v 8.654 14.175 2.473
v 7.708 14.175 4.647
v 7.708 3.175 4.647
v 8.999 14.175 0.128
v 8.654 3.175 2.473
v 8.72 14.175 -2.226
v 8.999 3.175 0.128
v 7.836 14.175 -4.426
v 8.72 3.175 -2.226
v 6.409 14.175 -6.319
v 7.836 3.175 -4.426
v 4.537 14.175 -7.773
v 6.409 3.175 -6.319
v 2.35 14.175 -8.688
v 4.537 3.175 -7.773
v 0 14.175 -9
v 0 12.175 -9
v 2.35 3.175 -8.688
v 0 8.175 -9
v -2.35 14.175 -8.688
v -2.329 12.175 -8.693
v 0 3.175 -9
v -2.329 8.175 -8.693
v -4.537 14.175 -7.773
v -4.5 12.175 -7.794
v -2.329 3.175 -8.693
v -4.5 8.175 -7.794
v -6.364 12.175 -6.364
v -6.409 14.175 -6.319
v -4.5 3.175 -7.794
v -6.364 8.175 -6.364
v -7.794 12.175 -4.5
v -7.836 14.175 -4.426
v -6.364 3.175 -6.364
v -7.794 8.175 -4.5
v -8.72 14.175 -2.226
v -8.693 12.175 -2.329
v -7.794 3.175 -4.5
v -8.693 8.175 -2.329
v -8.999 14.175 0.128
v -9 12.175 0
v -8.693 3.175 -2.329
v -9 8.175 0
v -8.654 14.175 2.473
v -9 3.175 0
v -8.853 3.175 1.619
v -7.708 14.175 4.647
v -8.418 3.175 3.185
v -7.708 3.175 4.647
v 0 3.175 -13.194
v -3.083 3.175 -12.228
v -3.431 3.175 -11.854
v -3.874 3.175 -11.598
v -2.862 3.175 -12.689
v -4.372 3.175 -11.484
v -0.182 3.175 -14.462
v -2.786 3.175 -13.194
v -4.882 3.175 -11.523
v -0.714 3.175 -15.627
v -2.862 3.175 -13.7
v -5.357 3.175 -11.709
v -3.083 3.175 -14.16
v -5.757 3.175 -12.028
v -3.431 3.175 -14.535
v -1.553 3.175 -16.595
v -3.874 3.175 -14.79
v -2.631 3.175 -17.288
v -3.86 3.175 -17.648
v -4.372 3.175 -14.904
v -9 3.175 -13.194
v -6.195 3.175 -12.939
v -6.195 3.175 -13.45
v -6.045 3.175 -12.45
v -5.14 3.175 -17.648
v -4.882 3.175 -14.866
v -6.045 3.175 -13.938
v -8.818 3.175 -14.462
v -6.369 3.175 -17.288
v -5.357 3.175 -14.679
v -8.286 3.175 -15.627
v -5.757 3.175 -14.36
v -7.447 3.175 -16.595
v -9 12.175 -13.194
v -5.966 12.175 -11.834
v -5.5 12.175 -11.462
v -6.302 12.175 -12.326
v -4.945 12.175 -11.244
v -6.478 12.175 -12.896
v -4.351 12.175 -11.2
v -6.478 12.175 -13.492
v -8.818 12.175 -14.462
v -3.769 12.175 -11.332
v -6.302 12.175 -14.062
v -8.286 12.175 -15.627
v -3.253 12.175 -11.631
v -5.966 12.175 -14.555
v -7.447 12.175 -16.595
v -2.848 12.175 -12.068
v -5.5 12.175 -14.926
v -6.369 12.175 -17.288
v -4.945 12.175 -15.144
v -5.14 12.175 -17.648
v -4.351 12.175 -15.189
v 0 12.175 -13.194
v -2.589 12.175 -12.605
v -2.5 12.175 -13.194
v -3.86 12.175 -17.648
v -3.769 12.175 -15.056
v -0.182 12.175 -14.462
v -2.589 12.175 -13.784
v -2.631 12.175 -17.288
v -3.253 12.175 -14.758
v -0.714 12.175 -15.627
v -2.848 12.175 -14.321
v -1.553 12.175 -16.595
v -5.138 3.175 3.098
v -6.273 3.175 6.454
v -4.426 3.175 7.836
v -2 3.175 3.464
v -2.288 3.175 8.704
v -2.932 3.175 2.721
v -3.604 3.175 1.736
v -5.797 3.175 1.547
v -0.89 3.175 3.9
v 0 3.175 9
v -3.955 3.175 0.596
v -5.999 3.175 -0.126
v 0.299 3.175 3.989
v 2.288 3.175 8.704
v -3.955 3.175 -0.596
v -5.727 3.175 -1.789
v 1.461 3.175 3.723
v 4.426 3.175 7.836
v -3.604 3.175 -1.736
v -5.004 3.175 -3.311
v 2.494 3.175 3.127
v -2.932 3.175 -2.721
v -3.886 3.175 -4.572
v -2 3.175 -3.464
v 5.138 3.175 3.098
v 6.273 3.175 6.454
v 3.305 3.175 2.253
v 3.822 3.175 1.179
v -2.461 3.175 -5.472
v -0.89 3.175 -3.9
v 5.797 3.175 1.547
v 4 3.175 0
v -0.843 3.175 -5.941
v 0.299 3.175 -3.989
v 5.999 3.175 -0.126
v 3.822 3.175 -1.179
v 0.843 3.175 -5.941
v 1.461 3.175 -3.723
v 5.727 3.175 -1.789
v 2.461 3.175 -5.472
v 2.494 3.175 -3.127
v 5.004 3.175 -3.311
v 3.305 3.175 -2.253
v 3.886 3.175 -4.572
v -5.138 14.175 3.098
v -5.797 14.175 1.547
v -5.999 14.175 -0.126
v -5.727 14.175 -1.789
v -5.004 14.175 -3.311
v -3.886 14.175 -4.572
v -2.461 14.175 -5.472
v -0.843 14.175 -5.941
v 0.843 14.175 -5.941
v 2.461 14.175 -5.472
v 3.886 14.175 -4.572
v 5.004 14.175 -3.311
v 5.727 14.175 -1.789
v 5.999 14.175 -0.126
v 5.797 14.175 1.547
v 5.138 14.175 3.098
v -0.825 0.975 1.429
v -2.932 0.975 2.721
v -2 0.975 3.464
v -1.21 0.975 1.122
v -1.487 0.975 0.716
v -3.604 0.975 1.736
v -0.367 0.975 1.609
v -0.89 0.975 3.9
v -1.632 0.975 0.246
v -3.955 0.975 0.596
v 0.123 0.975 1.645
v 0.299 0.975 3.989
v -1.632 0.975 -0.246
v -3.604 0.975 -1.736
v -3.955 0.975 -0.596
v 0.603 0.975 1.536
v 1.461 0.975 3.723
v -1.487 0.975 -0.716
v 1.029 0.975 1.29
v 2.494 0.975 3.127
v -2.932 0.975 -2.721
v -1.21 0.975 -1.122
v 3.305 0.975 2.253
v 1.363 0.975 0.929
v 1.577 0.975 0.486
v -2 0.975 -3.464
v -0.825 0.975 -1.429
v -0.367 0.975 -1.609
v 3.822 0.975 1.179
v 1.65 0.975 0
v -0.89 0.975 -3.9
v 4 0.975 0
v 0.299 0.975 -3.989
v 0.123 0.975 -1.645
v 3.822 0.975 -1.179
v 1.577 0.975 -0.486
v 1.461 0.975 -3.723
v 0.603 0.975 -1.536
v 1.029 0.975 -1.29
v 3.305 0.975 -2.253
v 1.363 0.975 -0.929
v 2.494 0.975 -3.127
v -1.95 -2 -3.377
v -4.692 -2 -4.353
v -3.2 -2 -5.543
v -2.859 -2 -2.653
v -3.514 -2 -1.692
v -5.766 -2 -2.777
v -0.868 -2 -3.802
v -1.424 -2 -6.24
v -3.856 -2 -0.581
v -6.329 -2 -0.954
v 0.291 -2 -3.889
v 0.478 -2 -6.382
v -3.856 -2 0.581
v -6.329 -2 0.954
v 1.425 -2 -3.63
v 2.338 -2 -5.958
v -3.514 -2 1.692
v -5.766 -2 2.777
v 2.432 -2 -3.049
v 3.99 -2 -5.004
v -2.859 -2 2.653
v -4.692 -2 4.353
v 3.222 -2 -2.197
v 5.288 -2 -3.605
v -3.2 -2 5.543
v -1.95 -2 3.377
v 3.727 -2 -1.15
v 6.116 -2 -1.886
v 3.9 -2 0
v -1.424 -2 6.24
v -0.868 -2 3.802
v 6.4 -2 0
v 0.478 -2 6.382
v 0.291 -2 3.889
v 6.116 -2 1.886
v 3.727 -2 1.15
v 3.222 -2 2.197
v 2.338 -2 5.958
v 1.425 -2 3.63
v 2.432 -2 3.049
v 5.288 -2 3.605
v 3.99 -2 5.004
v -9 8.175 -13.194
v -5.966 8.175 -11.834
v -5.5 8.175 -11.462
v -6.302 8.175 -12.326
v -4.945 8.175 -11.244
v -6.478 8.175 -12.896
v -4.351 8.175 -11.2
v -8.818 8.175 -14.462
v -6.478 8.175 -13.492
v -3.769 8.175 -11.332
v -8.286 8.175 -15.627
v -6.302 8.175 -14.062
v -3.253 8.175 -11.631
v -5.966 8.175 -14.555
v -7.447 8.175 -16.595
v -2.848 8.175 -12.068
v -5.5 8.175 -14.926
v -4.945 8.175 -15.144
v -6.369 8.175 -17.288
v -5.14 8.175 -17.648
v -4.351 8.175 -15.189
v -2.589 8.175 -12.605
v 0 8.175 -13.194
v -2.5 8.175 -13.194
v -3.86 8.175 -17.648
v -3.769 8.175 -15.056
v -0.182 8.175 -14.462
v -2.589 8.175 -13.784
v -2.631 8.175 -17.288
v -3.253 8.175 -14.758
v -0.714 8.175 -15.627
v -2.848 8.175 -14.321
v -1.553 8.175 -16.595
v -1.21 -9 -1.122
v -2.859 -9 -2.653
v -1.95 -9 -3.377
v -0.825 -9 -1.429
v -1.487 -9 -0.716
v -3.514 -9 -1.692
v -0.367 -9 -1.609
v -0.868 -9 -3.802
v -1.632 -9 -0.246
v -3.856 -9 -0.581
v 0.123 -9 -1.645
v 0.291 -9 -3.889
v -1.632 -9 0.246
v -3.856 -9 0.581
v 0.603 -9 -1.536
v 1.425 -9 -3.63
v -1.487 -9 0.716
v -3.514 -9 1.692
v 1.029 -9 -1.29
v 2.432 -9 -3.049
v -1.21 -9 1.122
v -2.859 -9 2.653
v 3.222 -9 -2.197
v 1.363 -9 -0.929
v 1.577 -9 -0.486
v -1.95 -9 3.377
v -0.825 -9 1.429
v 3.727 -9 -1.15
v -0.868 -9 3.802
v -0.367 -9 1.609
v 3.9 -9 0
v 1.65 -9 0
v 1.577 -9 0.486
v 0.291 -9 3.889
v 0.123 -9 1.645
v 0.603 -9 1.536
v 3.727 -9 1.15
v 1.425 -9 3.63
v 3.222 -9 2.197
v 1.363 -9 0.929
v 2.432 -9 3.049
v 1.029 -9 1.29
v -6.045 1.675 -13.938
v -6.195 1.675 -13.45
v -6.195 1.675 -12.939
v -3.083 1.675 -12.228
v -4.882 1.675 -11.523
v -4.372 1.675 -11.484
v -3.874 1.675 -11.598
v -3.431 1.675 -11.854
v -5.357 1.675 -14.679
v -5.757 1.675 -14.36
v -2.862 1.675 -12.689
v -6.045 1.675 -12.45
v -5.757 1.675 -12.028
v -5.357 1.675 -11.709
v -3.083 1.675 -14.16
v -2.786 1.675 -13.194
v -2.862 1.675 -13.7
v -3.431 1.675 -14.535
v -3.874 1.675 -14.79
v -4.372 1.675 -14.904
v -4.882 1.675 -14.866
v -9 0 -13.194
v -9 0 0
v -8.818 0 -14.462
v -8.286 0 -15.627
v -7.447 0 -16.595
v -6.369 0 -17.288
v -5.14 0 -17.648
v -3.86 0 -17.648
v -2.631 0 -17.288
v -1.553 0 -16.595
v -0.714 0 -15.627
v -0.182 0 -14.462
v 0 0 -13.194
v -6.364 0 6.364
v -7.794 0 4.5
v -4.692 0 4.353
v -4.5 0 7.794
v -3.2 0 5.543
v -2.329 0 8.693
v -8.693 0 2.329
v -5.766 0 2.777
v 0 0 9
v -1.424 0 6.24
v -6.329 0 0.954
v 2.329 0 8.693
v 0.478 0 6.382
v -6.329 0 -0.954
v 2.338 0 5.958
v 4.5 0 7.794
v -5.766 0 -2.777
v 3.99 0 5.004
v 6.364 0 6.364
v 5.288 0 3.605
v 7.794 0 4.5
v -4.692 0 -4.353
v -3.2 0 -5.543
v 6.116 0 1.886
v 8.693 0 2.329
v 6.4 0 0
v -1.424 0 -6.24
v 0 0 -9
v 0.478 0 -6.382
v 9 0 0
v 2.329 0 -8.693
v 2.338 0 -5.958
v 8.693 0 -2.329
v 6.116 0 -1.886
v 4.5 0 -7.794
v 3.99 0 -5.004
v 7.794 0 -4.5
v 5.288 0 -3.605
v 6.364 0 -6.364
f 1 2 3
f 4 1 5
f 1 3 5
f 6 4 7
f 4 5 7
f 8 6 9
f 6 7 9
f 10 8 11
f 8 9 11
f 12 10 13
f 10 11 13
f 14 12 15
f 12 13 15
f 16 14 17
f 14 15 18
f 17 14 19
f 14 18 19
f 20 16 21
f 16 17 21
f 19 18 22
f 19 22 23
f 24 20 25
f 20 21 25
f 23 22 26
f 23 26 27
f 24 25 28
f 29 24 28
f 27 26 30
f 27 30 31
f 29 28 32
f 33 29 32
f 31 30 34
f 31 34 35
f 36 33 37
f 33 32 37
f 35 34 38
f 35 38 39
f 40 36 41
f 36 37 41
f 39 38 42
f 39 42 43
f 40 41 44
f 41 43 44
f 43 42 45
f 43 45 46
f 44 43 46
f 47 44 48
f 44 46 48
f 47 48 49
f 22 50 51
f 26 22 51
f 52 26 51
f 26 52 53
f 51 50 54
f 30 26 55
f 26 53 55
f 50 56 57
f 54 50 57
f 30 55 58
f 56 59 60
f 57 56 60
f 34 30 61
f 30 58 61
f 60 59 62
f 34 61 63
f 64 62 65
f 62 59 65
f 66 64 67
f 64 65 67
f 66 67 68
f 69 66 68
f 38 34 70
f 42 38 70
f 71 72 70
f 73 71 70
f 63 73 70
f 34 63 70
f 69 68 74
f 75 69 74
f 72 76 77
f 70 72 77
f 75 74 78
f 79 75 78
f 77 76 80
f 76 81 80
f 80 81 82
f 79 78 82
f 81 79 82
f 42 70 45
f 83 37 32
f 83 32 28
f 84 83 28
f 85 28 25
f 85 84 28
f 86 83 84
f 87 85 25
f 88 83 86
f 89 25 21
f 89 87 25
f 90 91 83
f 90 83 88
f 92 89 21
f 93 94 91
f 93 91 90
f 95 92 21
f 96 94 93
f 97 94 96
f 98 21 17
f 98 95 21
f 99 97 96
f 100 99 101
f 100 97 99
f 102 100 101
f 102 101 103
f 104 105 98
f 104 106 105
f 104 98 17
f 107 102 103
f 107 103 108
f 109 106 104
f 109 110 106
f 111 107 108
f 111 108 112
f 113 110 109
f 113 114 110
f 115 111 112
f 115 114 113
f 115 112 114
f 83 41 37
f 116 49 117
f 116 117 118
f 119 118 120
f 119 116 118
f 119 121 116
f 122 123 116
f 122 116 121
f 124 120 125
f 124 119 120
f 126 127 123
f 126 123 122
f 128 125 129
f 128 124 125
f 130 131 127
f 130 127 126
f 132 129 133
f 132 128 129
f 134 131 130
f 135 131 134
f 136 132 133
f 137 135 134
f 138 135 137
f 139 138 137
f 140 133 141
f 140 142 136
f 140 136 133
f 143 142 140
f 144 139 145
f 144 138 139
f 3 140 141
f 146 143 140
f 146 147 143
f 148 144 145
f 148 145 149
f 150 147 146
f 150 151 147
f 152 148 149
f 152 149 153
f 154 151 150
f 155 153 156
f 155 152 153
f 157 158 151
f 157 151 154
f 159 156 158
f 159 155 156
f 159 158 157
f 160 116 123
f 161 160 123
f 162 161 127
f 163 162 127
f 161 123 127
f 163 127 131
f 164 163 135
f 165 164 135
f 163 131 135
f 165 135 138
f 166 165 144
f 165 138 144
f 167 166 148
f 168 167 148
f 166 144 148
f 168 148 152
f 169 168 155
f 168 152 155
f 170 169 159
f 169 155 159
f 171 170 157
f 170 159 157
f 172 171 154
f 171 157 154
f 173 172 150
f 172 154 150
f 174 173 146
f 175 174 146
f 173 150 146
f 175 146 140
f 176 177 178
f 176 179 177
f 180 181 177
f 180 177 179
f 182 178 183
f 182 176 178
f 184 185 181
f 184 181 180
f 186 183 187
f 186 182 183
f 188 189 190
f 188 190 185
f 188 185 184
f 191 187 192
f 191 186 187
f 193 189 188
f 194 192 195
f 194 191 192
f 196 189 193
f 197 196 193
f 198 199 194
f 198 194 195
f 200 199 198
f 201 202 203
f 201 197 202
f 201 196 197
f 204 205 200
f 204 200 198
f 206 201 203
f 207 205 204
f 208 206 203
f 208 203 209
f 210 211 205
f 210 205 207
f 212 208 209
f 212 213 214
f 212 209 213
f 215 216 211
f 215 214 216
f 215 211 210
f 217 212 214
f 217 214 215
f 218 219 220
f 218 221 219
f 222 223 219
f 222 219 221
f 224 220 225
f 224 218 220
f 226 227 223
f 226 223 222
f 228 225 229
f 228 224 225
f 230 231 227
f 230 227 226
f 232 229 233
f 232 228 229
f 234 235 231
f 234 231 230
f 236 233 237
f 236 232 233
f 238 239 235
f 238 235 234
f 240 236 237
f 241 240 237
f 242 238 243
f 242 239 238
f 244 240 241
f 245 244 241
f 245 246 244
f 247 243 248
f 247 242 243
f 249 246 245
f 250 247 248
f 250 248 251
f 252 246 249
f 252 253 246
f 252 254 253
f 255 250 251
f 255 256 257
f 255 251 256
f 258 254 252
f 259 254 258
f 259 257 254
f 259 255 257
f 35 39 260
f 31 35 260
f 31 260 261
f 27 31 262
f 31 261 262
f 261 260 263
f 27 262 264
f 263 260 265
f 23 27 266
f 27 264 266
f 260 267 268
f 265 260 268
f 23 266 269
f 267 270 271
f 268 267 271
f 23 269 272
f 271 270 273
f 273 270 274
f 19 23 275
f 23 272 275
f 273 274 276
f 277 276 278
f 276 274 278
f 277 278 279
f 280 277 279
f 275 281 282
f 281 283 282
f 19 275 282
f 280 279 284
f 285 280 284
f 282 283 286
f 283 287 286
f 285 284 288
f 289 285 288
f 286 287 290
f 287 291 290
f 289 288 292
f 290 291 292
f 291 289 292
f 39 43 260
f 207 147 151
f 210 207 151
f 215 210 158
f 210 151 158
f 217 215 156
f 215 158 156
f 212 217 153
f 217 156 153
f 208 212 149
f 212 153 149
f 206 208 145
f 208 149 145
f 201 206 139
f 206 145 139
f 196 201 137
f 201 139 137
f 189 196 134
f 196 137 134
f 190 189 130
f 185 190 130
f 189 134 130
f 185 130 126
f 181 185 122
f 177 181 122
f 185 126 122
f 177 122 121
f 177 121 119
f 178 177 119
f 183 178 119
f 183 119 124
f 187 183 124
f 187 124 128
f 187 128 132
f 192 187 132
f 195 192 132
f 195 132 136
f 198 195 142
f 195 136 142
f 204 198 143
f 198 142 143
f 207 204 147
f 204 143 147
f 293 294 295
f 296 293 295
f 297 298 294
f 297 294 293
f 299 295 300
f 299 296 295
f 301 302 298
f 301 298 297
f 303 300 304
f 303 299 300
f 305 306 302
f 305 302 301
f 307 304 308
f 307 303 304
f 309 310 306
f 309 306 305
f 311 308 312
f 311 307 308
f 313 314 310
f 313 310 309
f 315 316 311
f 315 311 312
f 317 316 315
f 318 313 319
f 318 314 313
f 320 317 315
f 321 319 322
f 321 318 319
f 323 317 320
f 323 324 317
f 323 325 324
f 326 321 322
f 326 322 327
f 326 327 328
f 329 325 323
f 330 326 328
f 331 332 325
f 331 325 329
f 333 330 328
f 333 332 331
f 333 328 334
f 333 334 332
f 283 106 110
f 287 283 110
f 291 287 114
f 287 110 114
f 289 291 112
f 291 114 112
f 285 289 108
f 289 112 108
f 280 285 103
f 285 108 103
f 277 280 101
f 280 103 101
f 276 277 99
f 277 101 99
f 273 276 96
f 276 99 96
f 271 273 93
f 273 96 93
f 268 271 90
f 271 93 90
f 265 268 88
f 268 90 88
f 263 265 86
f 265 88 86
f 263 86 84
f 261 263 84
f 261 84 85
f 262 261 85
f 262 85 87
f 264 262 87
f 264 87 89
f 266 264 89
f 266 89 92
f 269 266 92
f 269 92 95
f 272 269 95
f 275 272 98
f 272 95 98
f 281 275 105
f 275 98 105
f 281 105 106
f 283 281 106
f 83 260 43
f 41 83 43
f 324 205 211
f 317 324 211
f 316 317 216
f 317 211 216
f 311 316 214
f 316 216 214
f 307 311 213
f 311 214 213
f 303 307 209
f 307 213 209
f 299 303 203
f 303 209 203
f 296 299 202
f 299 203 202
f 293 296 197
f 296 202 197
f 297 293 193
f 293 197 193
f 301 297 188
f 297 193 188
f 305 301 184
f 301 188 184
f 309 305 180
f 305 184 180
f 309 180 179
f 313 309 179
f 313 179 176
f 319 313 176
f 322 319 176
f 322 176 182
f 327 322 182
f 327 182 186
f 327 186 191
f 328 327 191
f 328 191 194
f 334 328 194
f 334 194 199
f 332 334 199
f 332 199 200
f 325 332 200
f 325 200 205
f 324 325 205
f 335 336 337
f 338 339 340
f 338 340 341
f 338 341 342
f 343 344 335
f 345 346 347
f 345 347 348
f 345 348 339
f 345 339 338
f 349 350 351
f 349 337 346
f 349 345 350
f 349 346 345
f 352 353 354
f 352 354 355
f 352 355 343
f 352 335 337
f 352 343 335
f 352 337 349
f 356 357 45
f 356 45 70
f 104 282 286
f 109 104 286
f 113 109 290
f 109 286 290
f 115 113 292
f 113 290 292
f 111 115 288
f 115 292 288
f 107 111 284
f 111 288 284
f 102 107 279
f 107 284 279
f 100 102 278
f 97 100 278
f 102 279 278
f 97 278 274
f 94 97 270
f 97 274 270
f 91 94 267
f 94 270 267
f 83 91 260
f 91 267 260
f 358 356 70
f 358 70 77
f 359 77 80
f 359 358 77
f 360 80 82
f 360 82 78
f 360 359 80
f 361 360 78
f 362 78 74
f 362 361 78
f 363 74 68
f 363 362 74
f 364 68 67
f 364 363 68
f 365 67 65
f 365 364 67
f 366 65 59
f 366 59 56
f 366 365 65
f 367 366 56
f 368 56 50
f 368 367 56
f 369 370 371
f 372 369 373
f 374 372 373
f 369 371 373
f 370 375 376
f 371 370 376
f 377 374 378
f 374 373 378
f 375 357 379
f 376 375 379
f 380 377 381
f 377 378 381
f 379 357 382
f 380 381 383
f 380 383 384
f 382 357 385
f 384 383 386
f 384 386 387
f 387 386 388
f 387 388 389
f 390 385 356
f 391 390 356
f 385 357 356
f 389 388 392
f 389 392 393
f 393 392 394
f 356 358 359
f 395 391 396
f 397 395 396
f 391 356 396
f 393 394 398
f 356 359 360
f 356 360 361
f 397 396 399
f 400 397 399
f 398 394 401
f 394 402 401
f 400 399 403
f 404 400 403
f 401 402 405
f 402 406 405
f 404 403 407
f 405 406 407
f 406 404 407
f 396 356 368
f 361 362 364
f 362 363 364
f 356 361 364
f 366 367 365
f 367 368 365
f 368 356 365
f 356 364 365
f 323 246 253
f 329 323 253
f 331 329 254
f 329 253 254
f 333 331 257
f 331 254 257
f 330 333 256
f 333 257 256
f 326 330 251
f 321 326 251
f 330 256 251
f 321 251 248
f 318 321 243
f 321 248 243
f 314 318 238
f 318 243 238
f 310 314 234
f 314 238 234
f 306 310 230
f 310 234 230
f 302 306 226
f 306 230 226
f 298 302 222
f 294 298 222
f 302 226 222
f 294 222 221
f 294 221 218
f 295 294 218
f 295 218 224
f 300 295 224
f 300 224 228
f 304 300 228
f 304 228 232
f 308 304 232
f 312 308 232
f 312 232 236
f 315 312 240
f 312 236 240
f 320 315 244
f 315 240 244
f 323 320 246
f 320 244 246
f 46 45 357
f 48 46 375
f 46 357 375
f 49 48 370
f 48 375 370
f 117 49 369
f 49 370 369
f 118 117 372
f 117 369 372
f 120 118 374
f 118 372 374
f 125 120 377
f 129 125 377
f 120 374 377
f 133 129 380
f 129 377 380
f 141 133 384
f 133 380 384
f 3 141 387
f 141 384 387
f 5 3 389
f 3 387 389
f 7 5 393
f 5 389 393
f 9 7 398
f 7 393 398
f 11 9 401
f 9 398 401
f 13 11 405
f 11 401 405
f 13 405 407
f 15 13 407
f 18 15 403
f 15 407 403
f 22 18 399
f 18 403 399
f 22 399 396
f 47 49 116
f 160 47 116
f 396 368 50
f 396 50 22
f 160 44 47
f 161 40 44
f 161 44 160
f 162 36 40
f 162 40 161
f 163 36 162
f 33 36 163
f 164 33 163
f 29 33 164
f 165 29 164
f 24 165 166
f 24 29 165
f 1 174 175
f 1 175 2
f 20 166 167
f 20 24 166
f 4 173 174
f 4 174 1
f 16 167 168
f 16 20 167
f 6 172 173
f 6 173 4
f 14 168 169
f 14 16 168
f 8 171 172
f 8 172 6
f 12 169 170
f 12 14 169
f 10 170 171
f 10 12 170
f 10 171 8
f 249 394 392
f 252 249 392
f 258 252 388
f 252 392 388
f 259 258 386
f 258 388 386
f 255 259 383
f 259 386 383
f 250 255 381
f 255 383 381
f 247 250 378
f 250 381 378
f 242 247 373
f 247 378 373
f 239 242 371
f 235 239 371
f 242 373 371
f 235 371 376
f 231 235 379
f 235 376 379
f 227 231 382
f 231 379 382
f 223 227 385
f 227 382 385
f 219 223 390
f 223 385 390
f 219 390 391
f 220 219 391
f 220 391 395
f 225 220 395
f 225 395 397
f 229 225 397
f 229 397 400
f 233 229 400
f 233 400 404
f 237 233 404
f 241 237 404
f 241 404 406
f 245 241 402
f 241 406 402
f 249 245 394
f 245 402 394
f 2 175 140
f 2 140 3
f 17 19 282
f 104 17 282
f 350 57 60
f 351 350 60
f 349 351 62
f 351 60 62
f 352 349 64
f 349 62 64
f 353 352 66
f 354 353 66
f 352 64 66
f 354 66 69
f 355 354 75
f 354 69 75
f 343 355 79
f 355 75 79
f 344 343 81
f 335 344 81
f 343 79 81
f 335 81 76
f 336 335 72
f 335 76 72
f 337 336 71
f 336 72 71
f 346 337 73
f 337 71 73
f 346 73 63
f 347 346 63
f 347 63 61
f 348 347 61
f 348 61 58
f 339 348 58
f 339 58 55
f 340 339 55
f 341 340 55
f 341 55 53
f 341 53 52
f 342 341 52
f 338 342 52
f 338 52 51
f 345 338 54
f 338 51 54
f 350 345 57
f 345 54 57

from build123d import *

# Parameters (mm, degrees)
SKETCH1_R           = 9
BOSS_EXTRUDE1_DEPTH = 3.175
BOSS_EXTRUDE2_DEPTH = 11
SKETCH3_R           = 6.399999954
BOSS_EXTRUDE3_DEPTH = 2
SKETCH4_R           = 3.899999974
BOSS_EXTRUDE4_DEPTH = 6.999999906
BOSS_EXTRUDE5_DEPTH = 3.175
BOSS_EXTRUDE7_DEPTH = 4
SKETCH8_R           = 2
CUT_EXTRUDE1_DEPTH  = 4
SKETCH9_R           = 1.650000048
CUT_EXTRUDE2_DEPTH  = 12.175
SKETCH10_R          = 4
CUT_EXTRUDE3_DEPTH  = 2.2
SKETCH11_R          = 1.7145
CUT_EXTRUDE4_DEPTH  = 1.5


with BuildPart() as part:
    # Sketch1 → Boss-Extrude1 (new body)
    with BuildSketch(Plane(origin=(0, 0, 0), x_dir=(1, 0, 0), z_dir=(0, 1, 0))):
        Circle(SKETCH1_R)
    extrude(amount=BOSS_EXTRUDE1_DEPTH)

    # Sketch2 → Boss-Extrude2 (add)
    with BuildSketch(Plane(origin=(0, 3.175, 0), x_dir=(1, 0, 0), z_dir=(0, 1, 0))):
        with BuildLine():
            Line((-7.707704384, -4.646643211), (-5.138469589, -3.097762141))
            ThreePointArc((-5.138469589, -3.097762141), (0, 6), (5.138469589, -3.097762141))
            Line((5.138469589, -3.097762141), (7.707704384, -4.646643211))
            ThreePointArc((7.707704384, -4.646643211), (0, 9), (-7.707704384, -4.646643211))
        make_face()
    extrude(amount=BOSS_EXTRUDE2_DEPTH)

    # Sketch3 → Boss-Extrude3 (add)
    with BuildSketch(Plane.XZ):
        Circle(SKETCH3_R)
    extrude(amount=BOSS_EXTRUDE3_DEPTH)

    # Sketch4 → Boss-Extrude4 (add)
    with BuildSketch(Plane.XZ.offset(2)):
        Circle(SKETCH4_R)
    extrude(amount=BOSS_EXTRUDE4_DEPTH)

    # Sketch6 → Boss-Extrude5 (add)
    with BuildSketch(Plane(origin=(0, 0, 0), x_dir=(1, 0, 0), z_dir=(0, 1, 0))):
        with BuildLine():
            Line((-9, 0), (-9, 13.194197425))
            ThreePointArc((-9, 13.194197425), (-4.5, 17.694197425), (0, 13.194197425))
            Line((0, 13.194197425), (0, 9))
            ThreePointArc((0, 9), (-6.363961031, 6.363961031), (-9, 0))
        make_face()
    extrude(amount=BOSS_EXTRUDE5_DEPTH)

    # Sketch7 → Boss-Extrude7 (add)
    with BuildSketch(Plane(origin=(0, 8.174999906, 0), x_dir=(1, 0, 0), z_dir=(0, 1, 0))):
        with BuildLine():
            Line((0, 9), (0, 13.194197425))
            ThreePointArc((0, 13.194197425), (-4.5, 17.694197425), (-9, 13.194197425))
            Line((-9, 13.194197425), (-9, 0))
            ThreePointArc((-9, 0), (-6.363961031, 6.363961031), (0, 9))
        make_face()
    extrude(amount=BOSS_EXTRUDE7_DEPTH)

    # Sketch8 → Cut-Extrude1 (cut)
    with BuildSketch(Plane(origin=(0, 12.174999906, 0), x_dir=(1, 0, 0), z_dir=(0, 1, 0))):
        with Locations((-4.5, 13.194197425)):
            Circle(SKETCH8_R)
    extrude(amount=-CUT_EXTRUDE1_DEPTH, mode=Mode.SUBTRACT)

    # Sketch9 → Cut-Extrude2 (cut)
    with BuildSketch(Plane(origin=(0, 3.175, 0), x_dir=(1, 0, 0), z_dir=(0, 1, 0))):
        Circle(SKETCH9_R)
    extrude(amount=-CUT_EXTRUDE2_DEPTH, mode=Mode.SUBTRACT)

    # Sketch10 → Cut-Extrude3 (cut)
    with BuildSketch(Plane(origin=(0, 3.175, 0), x_dir=(1, 0, 0), z_dir=(0, 1, 0))):
        Circle(SKETCH10_R)
    extrude(amount=-CUT_EXTRUDE3_DEPTH, mode=Mode.SUBTRACT)

    # Sketch11 → Cut-Extrude4 (cut)
    with BuildSketch(Plane(origin=(0, 3.175, 0), x_dir=(1, 0, 0), z_dir=(0, 1, 0))):
        with Locations((-4.5, 13.194197425)):
            Circle(SKETCH11_R)
    extrude(amount=-CUT_EXTRUDE4_DEPTH, mode=Mode.SUBTRACT)


solid = part.part
